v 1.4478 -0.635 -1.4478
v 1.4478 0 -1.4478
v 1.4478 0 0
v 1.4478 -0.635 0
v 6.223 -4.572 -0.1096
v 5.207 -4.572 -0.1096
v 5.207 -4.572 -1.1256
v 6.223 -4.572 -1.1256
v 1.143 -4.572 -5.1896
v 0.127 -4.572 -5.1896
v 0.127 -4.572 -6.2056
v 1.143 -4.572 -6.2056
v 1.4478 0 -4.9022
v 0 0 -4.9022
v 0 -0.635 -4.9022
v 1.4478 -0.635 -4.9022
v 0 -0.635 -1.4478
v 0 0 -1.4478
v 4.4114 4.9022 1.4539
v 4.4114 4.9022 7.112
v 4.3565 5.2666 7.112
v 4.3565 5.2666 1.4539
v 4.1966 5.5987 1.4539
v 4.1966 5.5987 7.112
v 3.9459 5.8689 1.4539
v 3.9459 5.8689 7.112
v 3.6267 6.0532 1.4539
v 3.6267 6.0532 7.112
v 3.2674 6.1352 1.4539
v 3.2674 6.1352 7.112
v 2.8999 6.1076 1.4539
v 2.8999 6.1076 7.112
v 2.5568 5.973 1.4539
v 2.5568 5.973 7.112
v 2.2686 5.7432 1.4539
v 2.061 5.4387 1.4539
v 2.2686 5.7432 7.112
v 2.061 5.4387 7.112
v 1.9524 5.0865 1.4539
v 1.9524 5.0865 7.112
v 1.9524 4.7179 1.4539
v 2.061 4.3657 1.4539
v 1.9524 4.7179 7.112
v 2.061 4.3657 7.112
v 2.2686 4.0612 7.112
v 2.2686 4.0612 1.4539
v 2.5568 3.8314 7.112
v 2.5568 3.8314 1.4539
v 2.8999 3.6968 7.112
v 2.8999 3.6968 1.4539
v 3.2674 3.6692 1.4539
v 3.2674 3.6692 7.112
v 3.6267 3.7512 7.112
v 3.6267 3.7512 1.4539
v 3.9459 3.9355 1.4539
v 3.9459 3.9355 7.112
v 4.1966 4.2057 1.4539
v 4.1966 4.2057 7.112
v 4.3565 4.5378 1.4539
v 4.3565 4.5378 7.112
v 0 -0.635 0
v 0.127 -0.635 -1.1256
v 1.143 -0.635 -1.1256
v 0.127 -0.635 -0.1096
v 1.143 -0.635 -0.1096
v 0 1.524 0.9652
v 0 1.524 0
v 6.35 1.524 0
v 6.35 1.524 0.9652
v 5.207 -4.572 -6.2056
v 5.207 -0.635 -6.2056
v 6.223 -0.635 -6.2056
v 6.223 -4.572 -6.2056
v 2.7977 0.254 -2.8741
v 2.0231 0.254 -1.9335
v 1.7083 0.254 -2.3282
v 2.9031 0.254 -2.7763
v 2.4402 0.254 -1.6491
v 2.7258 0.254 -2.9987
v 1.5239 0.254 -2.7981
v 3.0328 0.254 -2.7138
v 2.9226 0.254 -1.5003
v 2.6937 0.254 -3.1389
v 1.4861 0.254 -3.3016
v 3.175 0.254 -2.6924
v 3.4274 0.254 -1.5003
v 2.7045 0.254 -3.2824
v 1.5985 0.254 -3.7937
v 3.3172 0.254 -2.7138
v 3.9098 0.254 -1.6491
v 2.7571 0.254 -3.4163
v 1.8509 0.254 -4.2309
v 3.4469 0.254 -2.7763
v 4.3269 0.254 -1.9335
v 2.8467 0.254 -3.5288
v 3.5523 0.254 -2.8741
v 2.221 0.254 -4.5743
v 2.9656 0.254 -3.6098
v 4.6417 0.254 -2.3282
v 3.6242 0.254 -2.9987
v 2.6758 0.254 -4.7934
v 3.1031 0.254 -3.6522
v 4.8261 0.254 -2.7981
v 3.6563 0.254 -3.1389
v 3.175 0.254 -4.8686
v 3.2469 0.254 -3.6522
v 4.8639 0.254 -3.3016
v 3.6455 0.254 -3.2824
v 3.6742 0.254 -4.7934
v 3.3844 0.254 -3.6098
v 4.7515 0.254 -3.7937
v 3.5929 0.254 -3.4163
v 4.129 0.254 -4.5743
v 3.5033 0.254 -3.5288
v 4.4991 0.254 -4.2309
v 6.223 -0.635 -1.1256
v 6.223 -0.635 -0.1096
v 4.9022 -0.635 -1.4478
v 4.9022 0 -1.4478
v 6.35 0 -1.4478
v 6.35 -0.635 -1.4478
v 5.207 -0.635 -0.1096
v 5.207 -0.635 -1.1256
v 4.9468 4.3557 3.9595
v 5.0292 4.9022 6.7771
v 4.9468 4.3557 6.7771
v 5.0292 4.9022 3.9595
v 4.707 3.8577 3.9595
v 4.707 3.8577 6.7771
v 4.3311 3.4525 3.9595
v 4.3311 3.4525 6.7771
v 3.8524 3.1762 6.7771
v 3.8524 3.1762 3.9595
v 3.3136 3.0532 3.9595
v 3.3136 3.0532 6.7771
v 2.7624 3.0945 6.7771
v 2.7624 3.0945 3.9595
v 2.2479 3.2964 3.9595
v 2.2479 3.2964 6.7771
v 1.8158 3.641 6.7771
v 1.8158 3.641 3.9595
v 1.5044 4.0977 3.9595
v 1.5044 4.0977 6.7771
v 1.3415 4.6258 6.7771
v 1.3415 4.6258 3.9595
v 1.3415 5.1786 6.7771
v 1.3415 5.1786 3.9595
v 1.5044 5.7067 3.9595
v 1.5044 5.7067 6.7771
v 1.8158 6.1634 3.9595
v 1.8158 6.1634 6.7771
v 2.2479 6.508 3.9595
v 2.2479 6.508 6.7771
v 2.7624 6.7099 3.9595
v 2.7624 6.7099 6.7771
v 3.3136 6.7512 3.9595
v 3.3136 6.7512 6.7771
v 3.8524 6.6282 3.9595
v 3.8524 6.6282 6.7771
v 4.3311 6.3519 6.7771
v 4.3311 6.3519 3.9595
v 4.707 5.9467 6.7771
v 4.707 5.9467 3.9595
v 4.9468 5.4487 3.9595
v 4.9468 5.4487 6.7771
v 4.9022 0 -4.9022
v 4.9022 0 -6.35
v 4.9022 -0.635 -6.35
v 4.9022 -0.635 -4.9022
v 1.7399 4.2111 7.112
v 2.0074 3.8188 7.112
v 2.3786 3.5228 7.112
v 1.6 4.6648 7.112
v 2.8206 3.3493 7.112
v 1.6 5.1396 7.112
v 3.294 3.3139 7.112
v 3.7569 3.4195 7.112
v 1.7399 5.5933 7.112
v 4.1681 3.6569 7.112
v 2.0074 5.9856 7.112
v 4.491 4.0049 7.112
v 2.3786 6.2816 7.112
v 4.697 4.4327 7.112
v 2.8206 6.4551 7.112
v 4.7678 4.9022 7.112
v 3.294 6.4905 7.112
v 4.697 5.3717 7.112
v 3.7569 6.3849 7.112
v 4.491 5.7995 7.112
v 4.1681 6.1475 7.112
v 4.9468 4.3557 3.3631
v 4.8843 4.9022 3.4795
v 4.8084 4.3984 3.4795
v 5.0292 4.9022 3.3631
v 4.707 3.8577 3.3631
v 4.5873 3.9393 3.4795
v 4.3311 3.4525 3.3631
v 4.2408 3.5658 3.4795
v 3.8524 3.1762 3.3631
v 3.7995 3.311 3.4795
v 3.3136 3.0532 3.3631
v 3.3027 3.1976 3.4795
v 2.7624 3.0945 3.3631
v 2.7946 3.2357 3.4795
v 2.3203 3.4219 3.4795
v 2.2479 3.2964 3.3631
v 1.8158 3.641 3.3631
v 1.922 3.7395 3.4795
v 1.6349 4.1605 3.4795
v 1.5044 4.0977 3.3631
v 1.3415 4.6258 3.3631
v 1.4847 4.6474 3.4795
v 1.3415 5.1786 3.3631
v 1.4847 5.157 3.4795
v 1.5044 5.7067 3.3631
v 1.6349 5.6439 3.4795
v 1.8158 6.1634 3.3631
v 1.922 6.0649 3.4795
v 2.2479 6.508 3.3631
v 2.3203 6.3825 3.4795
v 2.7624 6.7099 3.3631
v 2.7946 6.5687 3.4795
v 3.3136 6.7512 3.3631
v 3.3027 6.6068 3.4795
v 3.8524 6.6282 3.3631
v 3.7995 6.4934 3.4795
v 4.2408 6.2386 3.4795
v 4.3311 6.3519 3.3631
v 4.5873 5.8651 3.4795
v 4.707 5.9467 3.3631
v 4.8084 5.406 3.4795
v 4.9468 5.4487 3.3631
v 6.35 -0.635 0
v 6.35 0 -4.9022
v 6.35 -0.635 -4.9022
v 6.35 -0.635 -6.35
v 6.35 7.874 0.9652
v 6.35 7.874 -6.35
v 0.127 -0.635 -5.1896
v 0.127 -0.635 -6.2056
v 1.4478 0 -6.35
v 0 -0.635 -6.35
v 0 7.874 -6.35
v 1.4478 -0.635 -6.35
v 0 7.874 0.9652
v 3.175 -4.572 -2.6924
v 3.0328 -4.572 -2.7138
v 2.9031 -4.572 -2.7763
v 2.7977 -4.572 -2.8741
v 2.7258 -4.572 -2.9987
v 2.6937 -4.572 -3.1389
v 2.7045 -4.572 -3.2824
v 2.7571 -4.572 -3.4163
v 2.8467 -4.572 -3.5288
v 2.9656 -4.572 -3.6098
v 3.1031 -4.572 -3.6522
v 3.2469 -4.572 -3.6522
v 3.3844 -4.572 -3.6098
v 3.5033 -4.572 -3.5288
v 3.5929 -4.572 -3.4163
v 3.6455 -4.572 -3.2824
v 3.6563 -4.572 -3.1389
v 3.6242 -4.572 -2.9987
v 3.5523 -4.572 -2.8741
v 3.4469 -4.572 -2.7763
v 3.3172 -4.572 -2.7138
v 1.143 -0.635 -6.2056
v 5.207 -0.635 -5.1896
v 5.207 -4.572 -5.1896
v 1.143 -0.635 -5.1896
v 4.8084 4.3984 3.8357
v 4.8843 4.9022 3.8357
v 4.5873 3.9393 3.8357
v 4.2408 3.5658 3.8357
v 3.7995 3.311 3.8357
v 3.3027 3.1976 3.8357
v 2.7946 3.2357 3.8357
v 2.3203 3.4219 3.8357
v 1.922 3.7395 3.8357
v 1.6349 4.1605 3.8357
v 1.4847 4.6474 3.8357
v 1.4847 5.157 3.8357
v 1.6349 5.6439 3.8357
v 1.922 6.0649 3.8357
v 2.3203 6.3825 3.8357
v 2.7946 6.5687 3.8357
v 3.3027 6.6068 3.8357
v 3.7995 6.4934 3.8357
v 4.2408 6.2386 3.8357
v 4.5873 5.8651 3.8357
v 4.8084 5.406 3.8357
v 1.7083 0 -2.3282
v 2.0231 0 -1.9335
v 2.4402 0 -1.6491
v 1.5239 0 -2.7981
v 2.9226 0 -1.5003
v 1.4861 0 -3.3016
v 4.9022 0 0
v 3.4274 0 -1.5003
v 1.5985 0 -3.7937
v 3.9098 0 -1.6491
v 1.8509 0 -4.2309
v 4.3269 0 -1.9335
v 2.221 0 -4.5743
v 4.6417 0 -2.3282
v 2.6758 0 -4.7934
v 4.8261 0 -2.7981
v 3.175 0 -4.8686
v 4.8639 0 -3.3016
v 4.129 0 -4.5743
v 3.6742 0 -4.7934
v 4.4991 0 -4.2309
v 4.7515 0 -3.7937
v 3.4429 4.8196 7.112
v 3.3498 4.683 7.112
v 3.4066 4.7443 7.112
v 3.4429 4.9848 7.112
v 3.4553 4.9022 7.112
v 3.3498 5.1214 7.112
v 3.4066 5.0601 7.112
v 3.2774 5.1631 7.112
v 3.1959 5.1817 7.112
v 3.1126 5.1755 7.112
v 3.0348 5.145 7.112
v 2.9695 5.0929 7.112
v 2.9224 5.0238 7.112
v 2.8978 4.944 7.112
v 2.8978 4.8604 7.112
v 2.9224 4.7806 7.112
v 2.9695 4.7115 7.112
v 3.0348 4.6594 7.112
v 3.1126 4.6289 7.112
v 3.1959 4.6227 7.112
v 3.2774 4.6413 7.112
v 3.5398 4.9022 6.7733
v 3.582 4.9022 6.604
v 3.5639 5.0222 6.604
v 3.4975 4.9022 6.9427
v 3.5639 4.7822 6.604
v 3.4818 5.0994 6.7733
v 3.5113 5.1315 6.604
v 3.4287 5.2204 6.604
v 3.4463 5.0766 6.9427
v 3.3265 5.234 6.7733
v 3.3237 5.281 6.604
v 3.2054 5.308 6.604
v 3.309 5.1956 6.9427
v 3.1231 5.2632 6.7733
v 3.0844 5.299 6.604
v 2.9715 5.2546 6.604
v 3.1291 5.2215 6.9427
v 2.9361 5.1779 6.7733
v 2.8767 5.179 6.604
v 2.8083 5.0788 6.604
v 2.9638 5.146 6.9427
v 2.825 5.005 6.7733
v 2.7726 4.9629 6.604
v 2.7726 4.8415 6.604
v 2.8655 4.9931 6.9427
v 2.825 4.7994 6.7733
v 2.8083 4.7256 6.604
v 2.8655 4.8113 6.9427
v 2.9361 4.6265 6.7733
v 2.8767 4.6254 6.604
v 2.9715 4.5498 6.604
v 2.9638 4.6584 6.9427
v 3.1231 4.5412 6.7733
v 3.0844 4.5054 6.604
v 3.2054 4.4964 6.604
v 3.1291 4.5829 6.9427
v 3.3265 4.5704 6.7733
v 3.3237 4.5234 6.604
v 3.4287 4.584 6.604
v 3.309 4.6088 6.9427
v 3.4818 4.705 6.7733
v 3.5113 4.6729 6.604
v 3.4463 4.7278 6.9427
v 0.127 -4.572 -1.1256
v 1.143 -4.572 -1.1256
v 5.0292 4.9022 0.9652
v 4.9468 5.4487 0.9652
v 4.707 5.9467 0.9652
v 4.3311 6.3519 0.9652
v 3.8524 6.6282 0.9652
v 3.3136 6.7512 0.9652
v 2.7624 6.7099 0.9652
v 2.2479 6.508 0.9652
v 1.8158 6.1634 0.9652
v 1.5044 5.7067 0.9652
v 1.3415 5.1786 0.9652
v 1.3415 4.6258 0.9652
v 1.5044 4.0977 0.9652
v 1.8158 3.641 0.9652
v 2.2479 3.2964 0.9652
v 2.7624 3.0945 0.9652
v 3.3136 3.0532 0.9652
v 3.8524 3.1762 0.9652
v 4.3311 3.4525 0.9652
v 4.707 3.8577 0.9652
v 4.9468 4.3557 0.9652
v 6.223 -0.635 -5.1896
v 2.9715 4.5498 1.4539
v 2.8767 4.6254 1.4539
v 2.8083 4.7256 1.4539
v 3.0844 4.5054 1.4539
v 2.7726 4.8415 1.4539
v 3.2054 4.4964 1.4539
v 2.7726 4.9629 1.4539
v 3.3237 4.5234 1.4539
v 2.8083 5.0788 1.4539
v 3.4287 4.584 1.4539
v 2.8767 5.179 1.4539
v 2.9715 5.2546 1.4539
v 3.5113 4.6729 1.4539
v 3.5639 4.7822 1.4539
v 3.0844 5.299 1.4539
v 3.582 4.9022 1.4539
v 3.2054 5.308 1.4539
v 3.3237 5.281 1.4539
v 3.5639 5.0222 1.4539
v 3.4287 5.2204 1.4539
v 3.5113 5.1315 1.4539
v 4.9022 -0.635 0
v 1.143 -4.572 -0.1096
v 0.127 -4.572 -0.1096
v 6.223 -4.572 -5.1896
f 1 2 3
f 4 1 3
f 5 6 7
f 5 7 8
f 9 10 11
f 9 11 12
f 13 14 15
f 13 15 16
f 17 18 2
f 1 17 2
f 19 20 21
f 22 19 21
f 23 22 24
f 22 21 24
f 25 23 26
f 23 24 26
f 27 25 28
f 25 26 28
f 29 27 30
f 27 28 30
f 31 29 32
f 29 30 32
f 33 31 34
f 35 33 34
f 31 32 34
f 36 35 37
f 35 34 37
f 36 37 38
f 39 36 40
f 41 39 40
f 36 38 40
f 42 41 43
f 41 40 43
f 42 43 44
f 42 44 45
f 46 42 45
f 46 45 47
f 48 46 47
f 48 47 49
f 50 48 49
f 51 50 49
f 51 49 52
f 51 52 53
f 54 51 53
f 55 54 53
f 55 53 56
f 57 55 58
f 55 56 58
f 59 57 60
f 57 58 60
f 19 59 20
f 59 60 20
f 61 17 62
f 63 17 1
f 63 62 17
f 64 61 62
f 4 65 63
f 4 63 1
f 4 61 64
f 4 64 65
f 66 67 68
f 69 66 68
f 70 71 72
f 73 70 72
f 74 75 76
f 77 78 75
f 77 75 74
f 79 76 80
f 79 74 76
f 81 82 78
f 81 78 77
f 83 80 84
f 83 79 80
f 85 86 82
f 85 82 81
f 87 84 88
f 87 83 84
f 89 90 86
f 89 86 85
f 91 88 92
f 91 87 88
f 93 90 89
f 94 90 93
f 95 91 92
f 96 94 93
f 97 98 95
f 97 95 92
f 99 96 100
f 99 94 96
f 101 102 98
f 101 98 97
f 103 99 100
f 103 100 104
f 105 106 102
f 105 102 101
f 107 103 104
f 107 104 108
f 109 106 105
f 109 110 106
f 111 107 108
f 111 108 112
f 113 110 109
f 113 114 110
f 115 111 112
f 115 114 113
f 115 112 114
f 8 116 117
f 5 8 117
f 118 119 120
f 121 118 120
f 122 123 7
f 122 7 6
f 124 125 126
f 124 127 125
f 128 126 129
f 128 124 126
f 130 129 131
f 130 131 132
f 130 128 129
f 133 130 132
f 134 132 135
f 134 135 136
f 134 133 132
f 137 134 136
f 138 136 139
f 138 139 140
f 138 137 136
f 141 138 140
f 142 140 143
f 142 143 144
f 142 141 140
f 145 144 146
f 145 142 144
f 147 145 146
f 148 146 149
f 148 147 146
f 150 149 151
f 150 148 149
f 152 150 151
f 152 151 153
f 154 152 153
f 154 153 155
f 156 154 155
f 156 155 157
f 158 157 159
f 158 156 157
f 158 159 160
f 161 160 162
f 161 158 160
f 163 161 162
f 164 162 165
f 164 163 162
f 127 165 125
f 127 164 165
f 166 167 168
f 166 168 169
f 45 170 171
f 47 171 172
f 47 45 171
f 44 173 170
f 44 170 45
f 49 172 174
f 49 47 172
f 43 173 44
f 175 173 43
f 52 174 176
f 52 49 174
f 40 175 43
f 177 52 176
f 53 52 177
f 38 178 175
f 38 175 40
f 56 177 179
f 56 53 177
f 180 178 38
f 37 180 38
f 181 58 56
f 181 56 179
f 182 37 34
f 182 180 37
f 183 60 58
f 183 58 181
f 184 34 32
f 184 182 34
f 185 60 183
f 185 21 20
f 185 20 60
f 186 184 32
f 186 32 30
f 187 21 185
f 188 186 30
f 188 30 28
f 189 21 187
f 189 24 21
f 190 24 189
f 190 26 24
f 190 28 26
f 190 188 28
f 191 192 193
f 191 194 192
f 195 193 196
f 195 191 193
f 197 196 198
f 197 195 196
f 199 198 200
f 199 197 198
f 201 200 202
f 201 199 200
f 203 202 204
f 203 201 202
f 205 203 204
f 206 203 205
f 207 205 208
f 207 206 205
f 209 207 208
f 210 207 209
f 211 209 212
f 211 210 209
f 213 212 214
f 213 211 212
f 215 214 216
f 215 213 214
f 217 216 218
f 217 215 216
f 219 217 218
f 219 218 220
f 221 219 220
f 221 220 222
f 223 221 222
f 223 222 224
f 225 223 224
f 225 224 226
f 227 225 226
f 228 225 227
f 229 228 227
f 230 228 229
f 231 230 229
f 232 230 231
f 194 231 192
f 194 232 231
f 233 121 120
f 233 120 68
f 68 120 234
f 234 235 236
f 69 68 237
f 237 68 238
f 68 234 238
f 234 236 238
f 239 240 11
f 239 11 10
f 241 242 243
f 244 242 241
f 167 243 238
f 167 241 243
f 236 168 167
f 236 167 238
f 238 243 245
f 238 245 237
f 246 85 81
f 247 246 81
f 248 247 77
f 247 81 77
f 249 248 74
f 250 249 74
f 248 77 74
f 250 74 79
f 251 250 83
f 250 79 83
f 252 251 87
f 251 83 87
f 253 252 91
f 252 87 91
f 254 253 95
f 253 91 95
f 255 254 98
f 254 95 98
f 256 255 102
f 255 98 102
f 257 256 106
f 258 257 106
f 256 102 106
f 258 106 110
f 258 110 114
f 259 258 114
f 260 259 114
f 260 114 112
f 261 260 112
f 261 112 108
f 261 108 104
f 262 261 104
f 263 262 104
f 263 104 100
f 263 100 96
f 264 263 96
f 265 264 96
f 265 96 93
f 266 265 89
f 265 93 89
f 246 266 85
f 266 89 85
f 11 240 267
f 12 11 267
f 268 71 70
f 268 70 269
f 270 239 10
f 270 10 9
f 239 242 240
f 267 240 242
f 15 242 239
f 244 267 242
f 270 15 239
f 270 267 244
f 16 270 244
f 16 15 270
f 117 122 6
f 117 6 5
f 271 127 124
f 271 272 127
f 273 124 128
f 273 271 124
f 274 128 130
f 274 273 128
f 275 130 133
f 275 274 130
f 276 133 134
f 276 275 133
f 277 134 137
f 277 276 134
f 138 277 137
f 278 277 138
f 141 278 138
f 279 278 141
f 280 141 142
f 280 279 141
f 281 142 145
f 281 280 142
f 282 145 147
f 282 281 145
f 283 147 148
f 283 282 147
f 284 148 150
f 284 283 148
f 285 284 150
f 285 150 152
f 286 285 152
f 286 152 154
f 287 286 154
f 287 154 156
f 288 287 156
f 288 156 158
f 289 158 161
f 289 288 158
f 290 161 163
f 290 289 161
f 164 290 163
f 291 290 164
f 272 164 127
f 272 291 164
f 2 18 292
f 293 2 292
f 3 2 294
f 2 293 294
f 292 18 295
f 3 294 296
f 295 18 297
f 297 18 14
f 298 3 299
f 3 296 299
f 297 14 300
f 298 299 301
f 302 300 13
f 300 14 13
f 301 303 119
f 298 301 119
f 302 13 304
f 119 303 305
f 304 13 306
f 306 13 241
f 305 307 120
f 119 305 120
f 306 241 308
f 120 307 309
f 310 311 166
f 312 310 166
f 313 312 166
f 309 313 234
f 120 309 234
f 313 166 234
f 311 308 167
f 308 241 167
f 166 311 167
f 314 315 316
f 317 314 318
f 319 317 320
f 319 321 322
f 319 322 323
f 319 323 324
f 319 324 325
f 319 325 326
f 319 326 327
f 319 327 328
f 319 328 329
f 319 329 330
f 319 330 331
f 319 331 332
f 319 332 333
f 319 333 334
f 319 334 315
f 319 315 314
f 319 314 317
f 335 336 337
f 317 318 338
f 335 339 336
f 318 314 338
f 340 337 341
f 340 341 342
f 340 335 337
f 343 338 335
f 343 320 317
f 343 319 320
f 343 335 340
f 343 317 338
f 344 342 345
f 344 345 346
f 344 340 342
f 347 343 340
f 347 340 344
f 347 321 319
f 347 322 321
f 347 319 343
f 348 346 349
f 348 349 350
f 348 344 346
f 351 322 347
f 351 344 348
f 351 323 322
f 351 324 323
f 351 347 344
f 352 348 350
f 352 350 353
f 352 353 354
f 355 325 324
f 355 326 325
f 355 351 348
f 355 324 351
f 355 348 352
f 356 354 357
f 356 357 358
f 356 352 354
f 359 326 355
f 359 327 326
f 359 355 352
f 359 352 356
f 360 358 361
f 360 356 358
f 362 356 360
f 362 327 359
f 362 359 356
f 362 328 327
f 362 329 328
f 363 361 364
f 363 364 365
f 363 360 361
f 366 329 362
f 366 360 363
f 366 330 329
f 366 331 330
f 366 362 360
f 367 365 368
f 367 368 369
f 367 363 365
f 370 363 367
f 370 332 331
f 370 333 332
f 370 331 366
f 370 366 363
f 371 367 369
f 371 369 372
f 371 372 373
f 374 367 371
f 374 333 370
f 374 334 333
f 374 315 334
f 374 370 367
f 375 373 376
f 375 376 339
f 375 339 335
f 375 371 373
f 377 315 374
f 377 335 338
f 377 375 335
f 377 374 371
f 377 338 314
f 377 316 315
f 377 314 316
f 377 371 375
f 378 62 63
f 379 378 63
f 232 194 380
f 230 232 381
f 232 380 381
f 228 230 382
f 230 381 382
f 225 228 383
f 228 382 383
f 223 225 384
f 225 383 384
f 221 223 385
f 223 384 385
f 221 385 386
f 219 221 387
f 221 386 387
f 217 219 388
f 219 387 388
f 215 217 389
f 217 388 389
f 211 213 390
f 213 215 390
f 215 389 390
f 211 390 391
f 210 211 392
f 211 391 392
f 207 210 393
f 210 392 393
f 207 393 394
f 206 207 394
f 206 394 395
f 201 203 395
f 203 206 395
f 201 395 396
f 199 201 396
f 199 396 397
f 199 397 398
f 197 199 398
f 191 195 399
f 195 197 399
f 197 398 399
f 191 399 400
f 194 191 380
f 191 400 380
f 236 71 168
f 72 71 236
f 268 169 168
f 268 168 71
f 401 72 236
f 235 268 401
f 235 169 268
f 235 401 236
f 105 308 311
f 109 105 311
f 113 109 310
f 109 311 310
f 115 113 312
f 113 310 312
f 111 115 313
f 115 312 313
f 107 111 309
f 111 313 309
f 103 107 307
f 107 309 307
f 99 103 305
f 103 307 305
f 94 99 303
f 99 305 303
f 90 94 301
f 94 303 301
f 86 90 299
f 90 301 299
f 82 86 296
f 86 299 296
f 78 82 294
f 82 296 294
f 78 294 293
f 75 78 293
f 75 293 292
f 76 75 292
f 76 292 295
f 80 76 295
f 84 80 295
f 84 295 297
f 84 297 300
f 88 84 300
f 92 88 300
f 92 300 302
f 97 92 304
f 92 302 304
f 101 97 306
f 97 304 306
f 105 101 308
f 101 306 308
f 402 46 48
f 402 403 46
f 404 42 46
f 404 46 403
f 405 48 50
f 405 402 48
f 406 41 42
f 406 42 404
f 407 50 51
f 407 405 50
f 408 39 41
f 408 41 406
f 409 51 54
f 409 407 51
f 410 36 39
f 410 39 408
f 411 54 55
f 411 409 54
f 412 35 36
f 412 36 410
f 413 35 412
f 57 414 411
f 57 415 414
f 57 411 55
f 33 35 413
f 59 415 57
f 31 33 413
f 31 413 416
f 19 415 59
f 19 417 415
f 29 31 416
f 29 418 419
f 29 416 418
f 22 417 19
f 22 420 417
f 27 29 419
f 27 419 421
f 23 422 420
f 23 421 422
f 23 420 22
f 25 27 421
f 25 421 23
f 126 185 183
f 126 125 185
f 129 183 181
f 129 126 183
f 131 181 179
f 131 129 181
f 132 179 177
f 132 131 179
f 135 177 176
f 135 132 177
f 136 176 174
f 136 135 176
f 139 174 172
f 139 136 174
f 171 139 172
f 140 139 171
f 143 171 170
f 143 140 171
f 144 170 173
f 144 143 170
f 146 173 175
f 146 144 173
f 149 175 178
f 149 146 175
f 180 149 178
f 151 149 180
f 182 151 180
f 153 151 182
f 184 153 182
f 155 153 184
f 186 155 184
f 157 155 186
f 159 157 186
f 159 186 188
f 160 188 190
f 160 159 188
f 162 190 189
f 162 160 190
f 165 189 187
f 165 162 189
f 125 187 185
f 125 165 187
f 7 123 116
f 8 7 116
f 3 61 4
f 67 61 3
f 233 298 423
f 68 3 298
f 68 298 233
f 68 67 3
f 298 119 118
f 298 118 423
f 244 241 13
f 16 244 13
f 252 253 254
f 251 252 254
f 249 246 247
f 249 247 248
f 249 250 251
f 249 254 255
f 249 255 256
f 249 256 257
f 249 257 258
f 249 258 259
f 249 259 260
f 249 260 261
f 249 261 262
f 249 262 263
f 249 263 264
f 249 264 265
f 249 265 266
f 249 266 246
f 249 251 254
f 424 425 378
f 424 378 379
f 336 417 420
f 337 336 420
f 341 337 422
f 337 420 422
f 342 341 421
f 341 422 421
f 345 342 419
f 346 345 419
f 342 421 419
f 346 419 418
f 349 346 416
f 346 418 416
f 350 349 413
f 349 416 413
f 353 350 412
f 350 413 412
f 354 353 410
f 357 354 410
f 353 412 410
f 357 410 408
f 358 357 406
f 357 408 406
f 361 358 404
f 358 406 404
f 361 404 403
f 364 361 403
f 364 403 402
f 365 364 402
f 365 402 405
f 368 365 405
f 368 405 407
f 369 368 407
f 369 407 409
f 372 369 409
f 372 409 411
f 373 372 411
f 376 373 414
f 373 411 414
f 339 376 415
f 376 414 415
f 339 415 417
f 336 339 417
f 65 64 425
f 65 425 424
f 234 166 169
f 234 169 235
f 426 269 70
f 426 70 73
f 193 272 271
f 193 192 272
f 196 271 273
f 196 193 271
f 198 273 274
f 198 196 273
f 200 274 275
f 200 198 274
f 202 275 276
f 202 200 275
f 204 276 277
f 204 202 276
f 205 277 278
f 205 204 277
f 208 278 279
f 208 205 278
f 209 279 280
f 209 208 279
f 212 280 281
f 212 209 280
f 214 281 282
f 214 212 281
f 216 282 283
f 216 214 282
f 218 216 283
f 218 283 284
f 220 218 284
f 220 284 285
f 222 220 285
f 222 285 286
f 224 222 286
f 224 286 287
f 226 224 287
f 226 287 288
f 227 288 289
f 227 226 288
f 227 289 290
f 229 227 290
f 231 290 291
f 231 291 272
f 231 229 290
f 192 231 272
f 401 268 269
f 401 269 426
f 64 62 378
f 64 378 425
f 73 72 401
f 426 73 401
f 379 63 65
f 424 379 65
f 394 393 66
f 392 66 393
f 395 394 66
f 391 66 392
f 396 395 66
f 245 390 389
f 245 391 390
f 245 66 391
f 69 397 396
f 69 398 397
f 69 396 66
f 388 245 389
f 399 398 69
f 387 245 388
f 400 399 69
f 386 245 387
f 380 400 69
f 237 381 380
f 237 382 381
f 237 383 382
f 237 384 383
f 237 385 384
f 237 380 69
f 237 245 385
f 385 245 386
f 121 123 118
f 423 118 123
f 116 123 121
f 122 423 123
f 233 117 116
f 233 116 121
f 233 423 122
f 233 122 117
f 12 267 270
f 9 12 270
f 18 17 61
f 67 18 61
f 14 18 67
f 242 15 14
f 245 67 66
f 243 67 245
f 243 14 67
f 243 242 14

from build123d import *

# Parameters (mm, degrees)
SKETCH1_W          = 6.35
SKETCH1_H          = 6.35
EXTRUDE1_DEPTH     = 7.874
SKETCH2_W          = 1.4478
SKETCH2_H          = 1.4478
EXTRUDE2_DEPTH     = 0.635
SKETCH3_W          = 1.016
SKETCH3_H          = 1.016
EXTRUDE3_DEPTH     = 3.937
SKETCH4_R          = 1.693605641
CUT_EXTRUDE1_DEPTH = 0.254
SKETCH5_R          = 0.4826
EXTRUDE4_DEPTH     = 4.826
SKETCH6_W          = 6.35
SKETCH6_H          = 6.35
EXTRUDE5_DEPTH     = 0.9652
SKETCH7_R          = 1.8542
EXTRUDE6_DEPTH     = 6.1468
SKETCH9_R          = 1.236423773
CUT_EXTRUDE2_DEPTH = 5.658092827
SKETCH10_R         = 0.406972167
EXTRUDE7_DEPTH     = 5.658092827
CHAMFER1_SIZE      = 0.508
CHAMFER1_SIZE2     = 0.126658625


with BuildPart() as part:
    # Sketch1 → Extrude1 (new body)
    with BuildSketch(Plane(origin=(0, 0, 0), x_dir=(1, 0, 0), z_dir=(0, 1, 0))):
        with Locations((3.175, 3.175)):
            Rectangle(SKETCH1_W, SKETCH1_H)
    extrude(amount=EXTRUDE1_DEPTH)

    # Sketch2 → Extrude2 (add)
    with BuildSketch(Plane.XZ):
        with Locations((5.6261, -0.7239)):
            Rectangle(SKETCH2_W, SKETCH2_H)
        with Locations((5.6261, -5.6261)):
            Rectangle(SKETCH2_W, SKETCH2_H)
        with Locations((0.7239, -5.6261)):
            Rectangle(SKETCH2_W, SKETCH2_H)
        with Locations((0.7239, -0.7239)):
            Rectangle(SKETCH2_W, SKETCH2_H)
    extrude(amount=EXTRUDE2_DEPTH)

    # Sketch3 → Extrude3 (add)
    with BuildSketch(Plane.XZ.offset(0.635)):
        with Locations((5.715, -0.617649022)):
            Rectangle(SKETCH3_W, SKETCH3_H)
        with Locations((5.715, -5.697649022)):
            Rectangle(SKETCH3_W, SKETCH3_H)
        with Locations((0.635, -5.697649022)):
            Rectangle(SKETCH3_W, SKETCH3_H)
        with Locations((0.635, -0.617649022)):
            Rectangle(SKETCH3_W, SKETCH3_H)
    extrude(amount=EXTRUDE3_DEPTH)

    # Sketch4 → Cut-Extrude1 (cut)
    with BuildSketch(Plane.XZ):
        with Locations(Location((3.175, -3.175, 0), (0, 0, 270))):
            Circle(SKETCH4_R)
    extrude(amount=-CUT_EXTRUDE1_DEPTH, mode=Mode.SUBTRACT)

    # Sketch5 → Extrude4 (add)
    with BuildSketch(Plane.XZ.offset(-0.254)):
        with Locations(Location((3.175, -3.175, 0), (0, 0, 90))):
            Circle(SKETCH5_R)
    extrude(amount=EXTRUDE4_DEPTH)

    # Sketch6 → Extrude5 (add)
    with BuildSketch(Plane.XY):
        with Locations((3.175, 4.699)):
            Rectangle(SKETCH6_W, SKETCH6_H)
    extrude(amount=EXTRUDE5_DEPTH)

    # Sketch7 → Extrude6 (add)
    with BuildSketch(Plane.XY.offset(0.9652)):
        with Locations((3.175, 4.9022)):
            Circle(SKETCH7_R)
    extrude(amount=EXTRUDE6_DEPTH)

    # Sketch8 → Cut-Revolve1 (revolve, cut)
    with BuildSketch(Plane(origin=(0, 4.9022, 0), x_dir=(-1, 0, 0), z_dir=(0, 1, 0))):
        Polygon((-4.767796954, 7.112), (-5.0292, 6.777141647), (-5.0292, 3.959542683), (-4.884349235, 3.83568961), (-4.884349235, 3.47951039), (-5.0292, 3.363076056), (-5.0292, 0.9652), (-5.650551893, 0.9652), (-5.650551893, 7.801111761), align=None)
    revolve(axis=Axis((3.175, 4.9022, 7.112), (0, 0, -1)), mode=Mode.SUBTRACT)

    # Sketch9 → Cut-Extrude2 (cut)
    with BuildSketch(Plane.XY.offset(7.112)):
        with Locations((3.175, 4.9022)):
            Circle(SKETCH9_R)
    extrude(amount=-CUT_EXTRUDE2_DEPTH, mode=Mode.SUBTRACT)

    # Sketch10 → Extrude7 (add)
    with BuildSketch(Plane.XY.offset(1.453907173)):
        with Locations((3.175, 4.9022)):
            Circle(SKETCH10_R)
    extrude(amount=EXTRUDE7_DEPTH)

    # Chamfer1
    chamfer1_edges = [part.edges().sort_by_distance(p)[0] for p in [
        (2.768027833, 4.9022, 7.112),
    ]]
    chamfer1_side = [part.faces().sort_by_distance(p)[0] for p in [
        (2.768027833, 4.9022, 4.282953587),
    ]]
    chamfer(chamfer1_edges, length=CHAMFER1_SIZE, length2=CHAMFER1_SIZE2, reference=chamfer1_side[0])


solid = part.part
